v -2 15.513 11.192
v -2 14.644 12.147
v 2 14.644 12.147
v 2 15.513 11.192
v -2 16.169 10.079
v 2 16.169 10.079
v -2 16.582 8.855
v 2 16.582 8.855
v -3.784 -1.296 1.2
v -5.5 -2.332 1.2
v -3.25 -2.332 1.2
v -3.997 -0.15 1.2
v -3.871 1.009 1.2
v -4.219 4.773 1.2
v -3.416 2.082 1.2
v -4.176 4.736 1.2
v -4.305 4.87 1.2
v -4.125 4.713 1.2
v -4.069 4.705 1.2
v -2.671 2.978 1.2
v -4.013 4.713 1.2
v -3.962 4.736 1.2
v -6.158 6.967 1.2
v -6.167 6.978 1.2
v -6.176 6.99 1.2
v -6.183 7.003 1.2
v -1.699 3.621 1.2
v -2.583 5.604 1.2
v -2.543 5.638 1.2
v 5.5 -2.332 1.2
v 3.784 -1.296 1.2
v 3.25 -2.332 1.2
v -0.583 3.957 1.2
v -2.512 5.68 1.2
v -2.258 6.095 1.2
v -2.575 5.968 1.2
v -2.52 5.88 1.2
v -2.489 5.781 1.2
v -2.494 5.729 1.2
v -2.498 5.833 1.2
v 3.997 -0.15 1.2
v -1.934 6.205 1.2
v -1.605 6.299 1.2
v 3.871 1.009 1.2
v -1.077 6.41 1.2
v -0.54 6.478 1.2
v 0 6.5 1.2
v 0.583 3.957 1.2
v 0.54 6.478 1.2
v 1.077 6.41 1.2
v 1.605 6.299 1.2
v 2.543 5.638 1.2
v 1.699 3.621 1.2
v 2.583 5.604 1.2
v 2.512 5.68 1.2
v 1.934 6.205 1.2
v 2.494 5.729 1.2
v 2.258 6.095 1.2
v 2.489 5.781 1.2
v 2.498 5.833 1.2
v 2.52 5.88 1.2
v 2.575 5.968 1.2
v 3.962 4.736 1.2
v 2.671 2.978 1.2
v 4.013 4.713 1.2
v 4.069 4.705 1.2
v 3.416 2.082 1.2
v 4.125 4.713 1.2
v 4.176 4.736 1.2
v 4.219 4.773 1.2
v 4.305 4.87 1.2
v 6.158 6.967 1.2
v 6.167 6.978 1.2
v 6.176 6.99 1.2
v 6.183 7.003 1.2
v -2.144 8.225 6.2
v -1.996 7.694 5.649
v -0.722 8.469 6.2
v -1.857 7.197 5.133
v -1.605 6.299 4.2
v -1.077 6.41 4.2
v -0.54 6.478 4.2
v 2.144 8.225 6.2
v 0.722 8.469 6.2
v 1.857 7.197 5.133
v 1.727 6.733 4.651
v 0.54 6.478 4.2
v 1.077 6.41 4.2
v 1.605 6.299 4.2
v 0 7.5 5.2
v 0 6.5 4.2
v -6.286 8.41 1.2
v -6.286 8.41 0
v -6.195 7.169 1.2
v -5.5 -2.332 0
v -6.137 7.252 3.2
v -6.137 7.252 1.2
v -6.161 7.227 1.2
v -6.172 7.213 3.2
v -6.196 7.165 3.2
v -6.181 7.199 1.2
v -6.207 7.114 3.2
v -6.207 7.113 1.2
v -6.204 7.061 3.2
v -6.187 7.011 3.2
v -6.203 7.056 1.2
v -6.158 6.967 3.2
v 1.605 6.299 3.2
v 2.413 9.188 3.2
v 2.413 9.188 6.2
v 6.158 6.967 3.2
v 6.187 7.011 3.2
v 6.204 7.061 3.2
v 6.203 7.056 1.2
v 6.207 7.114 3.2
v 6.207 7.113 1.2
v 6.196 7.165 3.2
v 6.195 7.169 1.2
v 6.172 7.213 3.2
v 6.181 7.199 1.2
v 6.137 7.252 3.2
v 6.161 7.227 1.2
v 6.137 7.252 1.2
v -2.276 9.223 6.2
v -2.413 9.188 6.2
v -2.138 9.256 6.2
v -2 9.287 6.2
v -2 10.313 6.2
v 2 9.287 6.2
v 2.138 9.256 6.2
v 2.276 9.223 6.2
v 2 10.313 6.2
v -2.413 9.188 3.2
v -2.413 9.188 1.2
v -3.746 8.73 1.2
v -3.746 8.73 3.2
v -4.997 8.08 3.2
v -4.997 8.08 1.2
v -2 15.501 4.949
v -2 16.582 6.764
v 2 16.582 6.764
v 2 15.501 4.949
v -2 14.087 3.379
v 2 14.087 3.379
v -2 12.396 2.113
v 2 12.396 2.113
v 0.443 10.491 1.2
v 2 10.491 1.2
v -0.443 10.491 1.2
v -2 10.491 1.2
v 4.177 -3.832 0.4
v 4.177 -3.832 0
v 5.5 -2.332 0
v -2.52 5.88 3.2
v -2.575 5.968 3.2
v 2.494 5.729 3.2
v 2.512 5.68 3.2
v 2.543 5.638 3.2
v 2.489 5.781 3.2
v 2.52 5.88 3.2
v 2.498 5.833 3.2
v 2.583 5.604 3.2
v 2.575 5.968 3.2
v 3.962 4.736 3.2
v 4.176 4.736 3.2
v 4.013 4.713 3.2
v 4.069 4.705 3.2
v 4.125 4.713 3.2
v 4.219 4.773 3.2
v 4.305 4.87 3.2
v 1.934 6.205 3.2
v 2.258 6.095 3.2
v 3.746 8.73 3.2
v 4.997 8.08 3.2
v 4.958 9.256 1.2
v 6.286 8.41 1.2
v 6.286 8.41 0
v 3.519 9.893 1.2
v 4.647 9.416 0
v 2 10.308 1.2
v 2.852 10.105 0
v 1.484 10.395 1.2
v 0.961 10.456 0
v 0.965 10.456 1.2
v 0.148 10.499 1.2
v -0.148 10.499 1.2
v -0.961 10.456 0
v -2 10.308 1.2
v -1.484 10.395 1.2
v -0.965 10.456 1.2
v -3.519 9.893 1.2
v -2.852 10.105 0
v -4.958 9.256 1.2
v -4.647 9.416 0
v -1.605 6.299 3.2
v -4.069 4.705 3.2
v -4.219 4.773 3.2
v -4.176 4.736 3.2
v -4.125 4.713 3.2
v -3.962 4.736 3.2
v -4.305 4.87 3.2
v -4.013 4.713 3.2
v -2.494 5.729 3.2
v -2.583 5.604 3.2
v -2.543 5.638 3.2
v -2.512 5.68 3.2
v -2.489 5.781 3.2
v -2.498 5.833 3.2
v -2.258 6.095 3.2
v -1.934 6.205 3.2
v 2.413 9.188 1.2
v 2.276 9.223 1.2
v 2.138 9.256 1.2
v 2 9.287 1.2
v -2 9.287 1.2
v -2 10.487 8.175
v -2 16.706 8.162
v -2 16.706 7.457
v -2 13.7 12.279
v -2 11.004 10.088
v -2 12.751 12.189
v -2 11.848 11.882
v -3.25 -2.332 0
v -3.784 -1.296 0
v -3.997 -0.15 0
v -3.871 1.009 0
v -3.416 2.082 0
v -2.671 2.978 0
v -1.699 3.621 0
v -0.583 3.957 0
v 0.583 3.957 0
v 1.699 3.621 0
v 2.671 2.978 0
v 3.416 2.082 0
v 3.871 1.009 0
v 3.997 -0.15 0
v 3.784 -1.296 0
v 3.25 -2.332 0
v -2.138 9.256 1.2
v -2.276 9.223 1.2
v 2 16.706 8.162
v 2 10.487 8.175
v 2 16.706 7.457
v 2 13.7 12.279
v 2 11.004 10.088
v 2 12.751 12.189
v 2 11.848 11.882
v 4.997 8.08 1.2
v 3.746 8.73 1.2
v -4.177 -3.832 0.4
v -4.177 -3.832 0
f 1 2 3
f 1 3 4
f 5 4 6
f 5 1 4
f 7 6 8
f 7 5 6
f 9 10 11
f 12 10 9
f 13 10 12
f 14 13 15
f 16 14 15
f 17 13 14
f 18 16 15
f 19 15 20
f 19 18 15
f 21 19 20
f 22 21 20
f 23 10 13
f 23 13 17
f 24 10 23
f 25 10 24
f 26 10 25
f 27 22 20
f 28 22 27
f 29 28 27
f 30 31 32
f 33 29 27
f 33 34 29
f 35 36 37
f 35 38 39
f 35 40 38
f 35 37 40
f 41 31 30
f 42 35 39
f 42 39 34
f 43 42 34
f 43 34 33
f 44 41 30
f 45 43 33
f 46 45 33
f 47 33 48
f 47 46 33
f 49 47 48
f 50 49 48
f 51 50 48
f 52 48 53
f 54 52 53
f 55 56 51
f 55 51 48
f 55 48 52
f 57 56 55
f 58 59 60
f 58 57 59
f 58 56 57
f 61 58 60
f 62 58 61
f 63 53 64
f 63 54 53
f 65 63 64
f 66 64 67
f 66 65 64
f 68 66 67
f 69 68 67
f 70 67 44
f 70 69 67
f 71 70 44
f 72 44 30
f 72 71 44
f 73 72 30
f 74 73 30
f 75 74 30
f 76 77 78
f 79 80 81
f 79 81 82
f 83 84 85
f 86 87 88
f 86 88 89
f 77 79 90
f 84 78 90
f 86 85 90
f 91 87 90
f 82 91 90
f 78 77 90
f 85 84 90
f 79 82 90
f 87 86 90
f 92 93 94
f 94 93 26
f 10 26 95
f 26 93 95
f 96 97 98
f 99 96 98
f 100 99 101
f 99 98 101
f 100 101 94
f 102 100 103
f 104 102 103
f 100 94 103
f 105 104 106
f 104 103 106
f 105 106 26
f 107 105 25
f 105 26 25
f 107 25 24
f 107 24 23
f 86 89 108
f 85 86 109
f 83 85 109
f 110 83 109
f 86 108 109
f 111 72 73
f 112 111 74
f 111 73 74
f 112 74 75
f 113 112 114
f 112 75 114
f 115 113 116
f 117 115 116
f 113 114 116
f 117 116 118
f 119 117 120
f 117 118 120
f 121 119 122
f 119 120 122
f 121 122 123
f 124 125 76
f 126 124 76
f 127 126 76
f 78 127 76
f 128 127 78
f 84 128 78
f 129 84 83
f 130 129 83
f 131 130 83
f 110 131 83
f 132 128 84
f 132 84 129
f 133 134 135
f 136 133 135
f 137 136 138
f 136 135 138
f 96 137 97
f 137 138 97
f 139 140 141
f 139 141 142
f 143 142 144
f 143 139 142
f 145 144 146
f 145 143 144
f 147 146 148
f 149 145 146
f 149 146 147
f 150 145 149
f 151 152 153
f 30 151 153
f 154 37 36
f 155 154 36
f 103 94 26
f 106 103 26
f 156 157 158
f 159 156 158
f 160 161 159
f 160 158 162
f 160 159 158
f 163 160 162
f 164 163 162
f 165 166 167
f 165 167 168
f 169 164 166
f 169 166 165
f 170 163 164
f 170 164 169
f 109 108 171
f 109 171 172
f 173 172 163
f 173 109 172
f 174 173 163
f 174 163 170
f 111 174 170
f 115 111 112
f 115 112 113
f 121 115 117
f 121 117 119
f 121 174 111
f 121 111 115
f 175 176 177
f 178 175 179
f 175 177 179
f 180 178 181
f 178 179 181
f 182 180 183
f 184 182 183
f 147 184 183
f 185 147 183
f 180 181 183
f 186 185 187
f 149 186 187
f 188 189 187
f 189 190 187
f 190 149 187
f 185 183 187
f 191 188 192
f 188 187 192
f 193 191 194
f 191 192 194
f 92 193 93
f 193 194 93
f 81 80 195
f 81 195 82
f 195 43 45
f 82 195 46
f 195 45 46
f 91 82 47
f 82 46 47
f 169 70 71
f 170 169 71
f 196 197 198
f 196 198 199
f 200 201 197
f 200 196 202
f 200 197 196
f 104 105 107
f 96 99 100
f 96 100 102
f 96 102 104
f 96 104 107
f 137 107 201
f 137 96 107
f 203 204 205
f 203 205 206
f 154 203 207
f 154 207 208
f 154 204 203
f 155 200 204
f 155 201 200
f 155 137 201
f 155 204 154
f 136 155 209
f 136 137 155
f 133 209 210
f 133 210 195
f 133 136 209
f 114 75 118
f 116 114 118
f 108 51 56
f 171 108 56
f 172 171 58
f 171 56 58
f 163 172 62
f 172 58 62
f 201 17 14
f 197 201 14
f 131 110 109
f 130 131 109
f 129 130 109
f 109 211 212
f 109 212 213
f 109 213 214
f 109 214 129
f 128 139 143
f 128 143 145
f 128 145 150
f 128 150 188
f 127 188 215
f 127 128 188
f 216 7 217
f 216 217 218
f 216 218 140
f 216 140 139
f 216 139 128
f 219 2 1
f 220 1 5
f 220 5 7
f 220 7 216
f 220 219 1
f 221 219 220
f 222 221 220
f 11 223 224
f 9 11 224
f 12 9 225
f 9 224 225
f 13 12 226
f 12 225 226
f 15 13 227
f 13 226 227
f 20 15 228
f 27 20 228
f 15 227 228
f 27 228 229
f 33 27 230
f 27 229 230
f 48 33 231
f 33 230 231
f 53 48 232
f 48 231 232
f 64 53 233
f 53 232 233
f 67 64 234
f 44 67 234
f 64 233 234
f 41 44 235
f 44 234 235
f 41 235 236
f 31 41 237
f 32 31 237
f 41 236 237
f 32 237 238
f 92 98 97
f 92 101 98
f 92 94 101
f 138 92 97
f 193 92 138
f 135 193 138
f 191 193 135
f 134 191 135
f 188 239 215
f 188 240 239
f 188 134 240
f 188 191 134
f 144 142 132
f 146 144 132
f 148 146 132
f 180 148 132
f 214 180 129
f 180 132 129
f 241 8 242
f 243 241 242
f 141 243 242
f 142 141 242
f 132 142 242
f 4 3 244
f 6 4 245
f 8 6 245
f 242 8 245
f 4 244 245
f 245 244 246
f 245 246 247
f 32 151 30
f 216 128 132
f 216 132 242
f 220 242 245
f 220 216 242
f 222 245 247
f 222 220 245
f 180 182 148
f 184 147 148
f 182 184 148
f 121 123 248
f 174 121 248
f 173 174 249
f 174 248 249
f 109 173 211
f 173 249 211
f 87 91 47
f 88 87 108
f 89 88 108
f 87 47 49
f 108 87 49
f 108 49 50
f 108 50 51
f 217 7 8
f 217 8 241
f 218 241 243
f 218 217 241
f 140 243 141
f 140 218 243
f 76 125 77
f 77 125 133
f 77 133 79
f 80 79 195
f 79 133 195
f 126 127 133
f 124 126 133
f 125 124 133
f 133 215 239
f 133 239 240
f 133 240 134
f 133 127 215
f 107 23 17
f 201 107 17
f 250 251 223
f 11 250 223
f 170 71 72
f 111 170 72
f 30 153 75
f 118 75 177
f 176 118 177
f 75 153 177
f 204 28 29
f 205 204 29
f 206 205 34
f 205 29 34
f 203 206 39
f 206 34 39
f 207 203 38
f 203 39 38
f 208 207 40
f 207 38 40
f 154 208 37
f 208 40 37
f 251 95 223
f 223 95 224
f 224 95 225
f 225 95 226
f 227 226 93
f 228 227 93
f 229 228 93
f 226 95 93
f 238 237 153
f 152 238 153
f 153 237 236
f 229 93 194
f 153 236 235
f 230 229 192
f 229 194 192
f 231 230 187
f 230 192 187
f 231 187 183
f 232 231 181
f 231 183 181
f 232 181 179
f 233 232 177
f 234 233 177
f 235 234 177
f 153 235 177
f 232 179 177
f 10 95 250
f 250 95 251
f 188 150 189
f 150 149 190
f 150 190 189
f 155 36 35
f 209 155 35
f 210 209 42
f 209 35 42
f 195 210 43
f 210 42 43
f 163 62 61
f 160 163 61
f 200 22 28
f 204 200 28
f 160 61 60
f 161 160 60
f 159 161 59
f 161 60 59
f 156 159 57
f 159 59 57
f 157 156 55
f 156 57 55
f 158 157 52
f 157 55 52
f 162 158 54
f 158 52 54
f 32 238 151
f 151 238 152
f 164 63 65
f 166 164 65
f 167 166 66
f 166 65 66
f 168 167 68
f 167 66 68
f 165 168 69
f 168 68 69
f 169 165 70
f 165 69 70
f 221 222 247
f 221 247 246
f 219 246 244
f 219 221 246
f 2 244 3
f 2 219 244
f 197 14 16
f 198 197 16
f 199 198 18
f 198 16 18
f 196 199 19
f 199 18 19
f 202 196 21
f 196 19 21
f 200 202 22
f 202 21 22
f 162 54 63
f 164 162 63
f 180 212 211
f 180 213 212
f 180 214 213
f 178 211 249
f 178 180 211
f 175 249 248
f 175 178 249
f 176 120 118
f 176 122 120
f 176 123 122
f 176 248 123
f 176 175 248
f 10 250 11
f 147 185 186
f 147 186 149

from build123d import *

# Parameters (mm, degrees)
F1_DEPTH    = 1.2
F3_DEPTH    = 12.5
F5_DEPTH    = 2
F6_DEPTH    = 5
F7_T2_ANGLE = 119.2786087223
F8_DEPTH    = 5
F10_DEPTH   = 4
F11_DEPTH   = 5


# Not quite as in the source:
# - a fillet or chamfer that OpenCascade refuses, or shapes differently, is made with other operations: its cross-section is extruded or revolved along the edge and cut away or added
# - a feature names something its author has since deleted; it is built from what else it names


with BuildPart() as f1:
    # F0 (on Top) → F1 (new body)
    with BuildSketch(Plane.XY):
        with BuildLine():
            ThreePointArc((-3.25, -2.3318447633), (0, 4), (3.25, -2.3318447633))
            Line((3.25, -2.3318447633), (4.1771243445, -3.8318447633))
            Line((4.1771243445, -3.8318447633), (5.5, -2.3318447633))
            Line((5.5, -2.3318447633), (6.2861850371, 8.4103434936))
            ThreePointArc((6.2861850371, 8.4103434936), (0, 10.5), (-6.2861850371, 8.4103434936))
            Line((-6.2861850371, 8.4103434936), (-5.5, -2.3318447633))
            Line((-5.5, -2.3318447633), (-4.1771243445, -3.8318447633))
            Line((-4.1771243445, -3.8318447633), (-3.25, -2.3318447633))
        make_face()
    extrude(amount=F1_DEPTH)

    # F2 (on Right) → F3 (cut, symmetric)
    with BuildSketch(Plane.YZ):
        Polygon((-3.8318447633, 0.4), (-2.3318447633, 1.2), (-3.8318447633, 1.2), align=None)
    extrude(amount=F3_DEPTH, both=True, mode=Mode.SUBTRACT)

    # F4 (on face) → F5 (join)
    with BuildSketch(Plane.XY.offset(1.2)):
        with BuildLine():
            Line((0, 9.4893432962), (0, 9.5))
            ThreePointArc((0, 9.5), (-1.0056504861, 9.4466219941), (-2, 9.2870878105))
            ThreePointArc((-2, 9.2870878105), (-2.207287093, 9.2400153511), (-2.4134691055, 9.1883168686))
            Line((-2.4134691055, 9.1883168686), (-1.6054997382, 6.2986006851))
            ThreePointArc((-1.6054997382, 6.2986006851), (-0.809041268, 6.4494536378), (0, 6.5))
            Line((0, 6.5), (0, 9.4893432962))
        make_face()
        with BuildLine():
            Line((0, 10.3126084432), (0, 9.5))
            ThreePointArc((0, 9.5), (1.0056504861, 9.4466219941), (2, 9.2870878105))
            Line((2, 9.2870878105), (2, 10.3126084432))
            Line((2, 10.3126084432), (0, 10.3126084432))
        make_face()
        with BuildLine():
            ThreePointArc((2, 9.2870878105), (1.0056504861, 9.4466219941), (0, 9.5))
            Line((0, 9.5), (0, 9.4893432962))
            Line((0, 9.4893432962), (0, 6.5))
            ThreePointArc((0, 6.5), (0.809041268, 6.4494536378), (1.6054997382, 6.2986006851))
            Line((1.6054997382, 6.2986006851), (2.4134691055, 9.1883168686))
            ThreePointArc((2.4134691055, 9.1883168686), (2.207287093, 9.2400153511), (2, 9.2870878105))
        make_face()
        with BuildLine():
            ThreePointArc((-2, 9.2870878105), (-1.0056504861, 9.4466219941), (0, 9.5))
            Line((0, 9.5), (0, 10.3126084432))
            Line((0, 10.3126084432), (-2, 10.3126084432))
            Line((-2, 10.3126084432), (-2, 9.2870878105))
        make_face()
        with BuildLine():
            Line((-1.6054997382, 6.2986006851), (-2.4134691055, 9.1883168686))
            ThreePointArc((-2.4134691055, 9.1883168686), (-4.3834961594, 8.4282240965), (-6.1369591907, 7.2517399217))
            ThreePointArc((-6.1369591907, 7.2517399217), (-6.2072372931, 7.1135226449), (-6.1576144754, 6.9666192642))
            Line((-6.1576144754, 6.9666192642), (-4.3047045796, 4.8702688306))
            Line((-4.3047045796, 4.8702688306), (-4.2185888433, 4.7728389657))
            ThreePointArc((-4.2185888433, 4.7728389657), (-4.0971505607, 4.7073203992), (-3.9621862374, 4.7360357341))
            Line((-3.9621862374, 4.7360357341), (-2.5827247856, 5.6044208159))
            ThreePointArc((-2.5827247856, 5.6044208159), (-2.4942501859, 5.7293355978), (-2.5200172859, 5.8802246764))
            Line((-2.5200172859, 5.8802246764), (-2.5753119947, 5.968062343))
            ThreePointArc((-2.5753119947, 5.968062343), (-2.096928846, 6.152470188), (-1.6054997382, 6.2986006851))
        make_face()
        with BuildLine():
            ThreePointArc((6.1369591907, 7.2517399217), (4.3834961594, 8.4282240965), (2.4134691055, 9.1883168686))
            Line((2.4134691055, 9.1883168686), (1.6054997382, 6.2986006851))
            ThreePointArc((1.6054997382, 6.2986006851), (2.096928846, 6.152470188), (2.5753119947, 5.968062343))
            Line((2.5753119947, 5.968062343), (2.5200172859, 5.8802246764))
            ThreePointArc((2.5200172859, 5.8802246764), (2.4942501859, 5.7293355978), (2.5827247856, 5.6044208159))
            Line((2.5827247856, 5.6044208159), (3.9621862374, 4.7360357341))
            ThreePointArc((3.9621862374, 4.7360357341), (4.0971505607, 4.7073203992), (4.2185888433, 4.7728389657))
            Line((4.2185888433, 4.7728389657), (4.3047045796, 4.8702688306))
            Line((4.3047045796, 4.8702688306), (6.1576144754, 6.9666192642))
            ThreePointArc((6.1576144754, 6.9666192642), (6.2072372931, 7.1135226449), (6.1369591907, 7.2517399217))
        make_face()
    extrude(amount=F5_DEPTH)

    # F4 (on face) → F6 (join)
    with BuildSketch(Plane.XY.offset(1.2)):
        with BuildLine():
            ThreePointArc((2, 9.2870878105), (1.0056504861, 9.4466219941), (0, 9.5))
            Line((0, 9.5), (0, 9.4893432962))
            Line((0, 9.4893432962), (0, 6.5))
            ThreePointArc((0, 6.5), (0.809041268, 6.4494536378), (1.6054997382, 6.2986006851))
            Line((1.6054997382, 6.2986006851), (2.4134691055, 9.1883168686))
            ThreePointArc((2.4134691055, 9.1883168686), (2.207287093, 9.2400153511), (2, 9.2870878105))
        make_face()
        with BuildLine():
            Line((0, 9.4893432962), (0, 9.5))
            ThreePointArc((0, 9.5), (-1.0056504861, 9.4466219941), (-2, 9.2870878105))
            ThreePointArc((-2, 9.2870878105), (-2.207287093, 9.2400153511), (-2.4134691055, 9.1883168686))
            Line((-2.4134691055, 9.1883168686), (-1.6054997382, 6.2986006851))
            ThreePointArc((-1.6054997382, 6.2986006851), (-0.809041268, 6.4494536378), (0, 6.5))
            Line((0, 6.5), (0, 9.4893432962))
        make_face()
    extrude(amount=F6_DEPTH)

    # F7: chamfer of 2 on 1 edges, made by hand

    # F7_s1 → F7_t2 (revolve, cut)
    with BuildSketch(Plane(origin=(0, 0, 0), x_dir=(0, 0, 1), z_dir=(-0.5054419689, -0.8628606006, 0))):
        Polygon((6.2, 8.5), (4.2, 6.5), (6.2, 6.5), align=None)
    revolve(axis=Axis((0, 0, 6.2), (0, 0, -1)), revolution_arc=F7_T2_ANGLE, mode=Mode.SUBTRACT)

    # F4 (on face) → F8 (join, through all)
    with BuildSketch(Plane.XY.offset(1.2)):
        with BuildLine():
            Line((0, 10.3126084432), (0, 9.5))
            ThreePointArc((0, 9.5), (1.0056504861, 9.4466219941), (2, 9.2870878105))
            Line((2, 9.2870878105), (2, 10.307764064))
            ThreePointArc((2, 10.307764064), (1.9874359165, 10.3101939108), (1.974868881, 10.3126084432))
            Line((1.974868881, 10.3126084432), (0, 10.3126084432))
        make_face()
        with BuildLine():
            ThreePointArc((1.974868881, 10.3126084432), (1.9874359165, 10.3101939108), (2, 10.307764064))
            Line((2, 10.307764064), (2, 10.3126084432))
            Line((2, 10.3126084432), (1.974868881, 10.3126084432))
        make_face()
        with BuildLine():
            Line((-2, 10.3126084432), (-2, 10.307764064))
            ThreePointArc((-2, 10.307764064), (-1.9874359165, 10.3101939108), (-1.974868881, 10.3126084432))
            Line((-1.974868881, 10.3126084432), (-2, 10.3126084432))
        make_face()
        with BuildLine():
            ThreePointArc((-2, 9.2870878105), (-1.0056504861, 9.4466219941), (0, 9.5))
            Line((0, 9.5), (0, 10.3126084432))
            Line((0, 10.3126084432), (-1.974868881, 10.3126084432))
            ThreePointArc((-1.974868881, 10.3126084432), (-1.9874359165, 10.3101939108), (-2, 10.307764064))
            Line((-2, 10.307764064), (-2, 9.2870878105))
        make_face()
    extrude(amount=F8_DEPTH)

    # F9 (on face) → F10 (join)
    with BuildSketch(Plane(origin=(-2, 0, 0), x_dir=(0, -1, 0), z_dir=(-1, 0, 0))):
        with BuildLine():
            Line((-10.4906475171, 1.2), (-10.3126084432, 1.2))
            Line((-10.3126084432, 1.2), (-10.3126084432, 6.2))
            ThreePointArc((-10.3126084432, 6.2), (-10.7033019047, 9.142871965), (-11.848315427, 11.8818646297))
            ThreePointArc((-11.848315427, 11.8818646297), (-13.2228522743, 12.2616673302), (-14.6442650052, 12.1468305588))
            ThreePointArc((-14.6442650052, 12.1468305588), (-15.8696799602, 10.6519801079), (-16.5821556002, 8.8551500812))
            ThreePointArc((-16.5821556002, 8.8551500812), (-16.7217466821, 7.8095628414), (-16.5821556002, 6.7639756016))
            ThreePointArc((-16.5821556002, 6.7639756016), (-14.0870903715, 3.3790869985), (-10.4906475171, 1.2))
        make_face()
    extrude(amount=-F10_DEPTH)

    # F4 (on face) → F11 (join, through all)
    with BuildSketch(Plane.XY.offset(1.2)):
        with BuildLine():
            Line((0, 10.3126084432), (0, 9.5))
            ThreePointArc((0, 9.5), (1.0056504861, 9.4466219941), (2, 9.2870878105))
            Line((2, 9.2870878105), (2, 10.307764064))
            ThreePointArc((2, 10.307764064), (1.9874359165, 10.3101939108), (1.974868881, 10.3126084432))
            Line((1.974868881, 10.3126084432), (0, 10.3126084432))
        make_face()
        with BuildLine():
            ThreePointArc((-2, 9.2870878105), (-1.0056504861, 9.4466219941), (0, 9.5))
            Line((0, 9.5), (0, 10.3126084432))
            Line((0, 10.3126084432), (-1.974868881, 10.3126084432))
            ThreePointArc((-1.974868881, 10.3126084432), (-1.9874359165, 10.3101939108), (-2, 10.307764064))
            Line((-2, 10.307764064), (-2, 9.2870878105))
        make_face()
    extrude(amount=F11_DEPTH)


solid = f1.part
